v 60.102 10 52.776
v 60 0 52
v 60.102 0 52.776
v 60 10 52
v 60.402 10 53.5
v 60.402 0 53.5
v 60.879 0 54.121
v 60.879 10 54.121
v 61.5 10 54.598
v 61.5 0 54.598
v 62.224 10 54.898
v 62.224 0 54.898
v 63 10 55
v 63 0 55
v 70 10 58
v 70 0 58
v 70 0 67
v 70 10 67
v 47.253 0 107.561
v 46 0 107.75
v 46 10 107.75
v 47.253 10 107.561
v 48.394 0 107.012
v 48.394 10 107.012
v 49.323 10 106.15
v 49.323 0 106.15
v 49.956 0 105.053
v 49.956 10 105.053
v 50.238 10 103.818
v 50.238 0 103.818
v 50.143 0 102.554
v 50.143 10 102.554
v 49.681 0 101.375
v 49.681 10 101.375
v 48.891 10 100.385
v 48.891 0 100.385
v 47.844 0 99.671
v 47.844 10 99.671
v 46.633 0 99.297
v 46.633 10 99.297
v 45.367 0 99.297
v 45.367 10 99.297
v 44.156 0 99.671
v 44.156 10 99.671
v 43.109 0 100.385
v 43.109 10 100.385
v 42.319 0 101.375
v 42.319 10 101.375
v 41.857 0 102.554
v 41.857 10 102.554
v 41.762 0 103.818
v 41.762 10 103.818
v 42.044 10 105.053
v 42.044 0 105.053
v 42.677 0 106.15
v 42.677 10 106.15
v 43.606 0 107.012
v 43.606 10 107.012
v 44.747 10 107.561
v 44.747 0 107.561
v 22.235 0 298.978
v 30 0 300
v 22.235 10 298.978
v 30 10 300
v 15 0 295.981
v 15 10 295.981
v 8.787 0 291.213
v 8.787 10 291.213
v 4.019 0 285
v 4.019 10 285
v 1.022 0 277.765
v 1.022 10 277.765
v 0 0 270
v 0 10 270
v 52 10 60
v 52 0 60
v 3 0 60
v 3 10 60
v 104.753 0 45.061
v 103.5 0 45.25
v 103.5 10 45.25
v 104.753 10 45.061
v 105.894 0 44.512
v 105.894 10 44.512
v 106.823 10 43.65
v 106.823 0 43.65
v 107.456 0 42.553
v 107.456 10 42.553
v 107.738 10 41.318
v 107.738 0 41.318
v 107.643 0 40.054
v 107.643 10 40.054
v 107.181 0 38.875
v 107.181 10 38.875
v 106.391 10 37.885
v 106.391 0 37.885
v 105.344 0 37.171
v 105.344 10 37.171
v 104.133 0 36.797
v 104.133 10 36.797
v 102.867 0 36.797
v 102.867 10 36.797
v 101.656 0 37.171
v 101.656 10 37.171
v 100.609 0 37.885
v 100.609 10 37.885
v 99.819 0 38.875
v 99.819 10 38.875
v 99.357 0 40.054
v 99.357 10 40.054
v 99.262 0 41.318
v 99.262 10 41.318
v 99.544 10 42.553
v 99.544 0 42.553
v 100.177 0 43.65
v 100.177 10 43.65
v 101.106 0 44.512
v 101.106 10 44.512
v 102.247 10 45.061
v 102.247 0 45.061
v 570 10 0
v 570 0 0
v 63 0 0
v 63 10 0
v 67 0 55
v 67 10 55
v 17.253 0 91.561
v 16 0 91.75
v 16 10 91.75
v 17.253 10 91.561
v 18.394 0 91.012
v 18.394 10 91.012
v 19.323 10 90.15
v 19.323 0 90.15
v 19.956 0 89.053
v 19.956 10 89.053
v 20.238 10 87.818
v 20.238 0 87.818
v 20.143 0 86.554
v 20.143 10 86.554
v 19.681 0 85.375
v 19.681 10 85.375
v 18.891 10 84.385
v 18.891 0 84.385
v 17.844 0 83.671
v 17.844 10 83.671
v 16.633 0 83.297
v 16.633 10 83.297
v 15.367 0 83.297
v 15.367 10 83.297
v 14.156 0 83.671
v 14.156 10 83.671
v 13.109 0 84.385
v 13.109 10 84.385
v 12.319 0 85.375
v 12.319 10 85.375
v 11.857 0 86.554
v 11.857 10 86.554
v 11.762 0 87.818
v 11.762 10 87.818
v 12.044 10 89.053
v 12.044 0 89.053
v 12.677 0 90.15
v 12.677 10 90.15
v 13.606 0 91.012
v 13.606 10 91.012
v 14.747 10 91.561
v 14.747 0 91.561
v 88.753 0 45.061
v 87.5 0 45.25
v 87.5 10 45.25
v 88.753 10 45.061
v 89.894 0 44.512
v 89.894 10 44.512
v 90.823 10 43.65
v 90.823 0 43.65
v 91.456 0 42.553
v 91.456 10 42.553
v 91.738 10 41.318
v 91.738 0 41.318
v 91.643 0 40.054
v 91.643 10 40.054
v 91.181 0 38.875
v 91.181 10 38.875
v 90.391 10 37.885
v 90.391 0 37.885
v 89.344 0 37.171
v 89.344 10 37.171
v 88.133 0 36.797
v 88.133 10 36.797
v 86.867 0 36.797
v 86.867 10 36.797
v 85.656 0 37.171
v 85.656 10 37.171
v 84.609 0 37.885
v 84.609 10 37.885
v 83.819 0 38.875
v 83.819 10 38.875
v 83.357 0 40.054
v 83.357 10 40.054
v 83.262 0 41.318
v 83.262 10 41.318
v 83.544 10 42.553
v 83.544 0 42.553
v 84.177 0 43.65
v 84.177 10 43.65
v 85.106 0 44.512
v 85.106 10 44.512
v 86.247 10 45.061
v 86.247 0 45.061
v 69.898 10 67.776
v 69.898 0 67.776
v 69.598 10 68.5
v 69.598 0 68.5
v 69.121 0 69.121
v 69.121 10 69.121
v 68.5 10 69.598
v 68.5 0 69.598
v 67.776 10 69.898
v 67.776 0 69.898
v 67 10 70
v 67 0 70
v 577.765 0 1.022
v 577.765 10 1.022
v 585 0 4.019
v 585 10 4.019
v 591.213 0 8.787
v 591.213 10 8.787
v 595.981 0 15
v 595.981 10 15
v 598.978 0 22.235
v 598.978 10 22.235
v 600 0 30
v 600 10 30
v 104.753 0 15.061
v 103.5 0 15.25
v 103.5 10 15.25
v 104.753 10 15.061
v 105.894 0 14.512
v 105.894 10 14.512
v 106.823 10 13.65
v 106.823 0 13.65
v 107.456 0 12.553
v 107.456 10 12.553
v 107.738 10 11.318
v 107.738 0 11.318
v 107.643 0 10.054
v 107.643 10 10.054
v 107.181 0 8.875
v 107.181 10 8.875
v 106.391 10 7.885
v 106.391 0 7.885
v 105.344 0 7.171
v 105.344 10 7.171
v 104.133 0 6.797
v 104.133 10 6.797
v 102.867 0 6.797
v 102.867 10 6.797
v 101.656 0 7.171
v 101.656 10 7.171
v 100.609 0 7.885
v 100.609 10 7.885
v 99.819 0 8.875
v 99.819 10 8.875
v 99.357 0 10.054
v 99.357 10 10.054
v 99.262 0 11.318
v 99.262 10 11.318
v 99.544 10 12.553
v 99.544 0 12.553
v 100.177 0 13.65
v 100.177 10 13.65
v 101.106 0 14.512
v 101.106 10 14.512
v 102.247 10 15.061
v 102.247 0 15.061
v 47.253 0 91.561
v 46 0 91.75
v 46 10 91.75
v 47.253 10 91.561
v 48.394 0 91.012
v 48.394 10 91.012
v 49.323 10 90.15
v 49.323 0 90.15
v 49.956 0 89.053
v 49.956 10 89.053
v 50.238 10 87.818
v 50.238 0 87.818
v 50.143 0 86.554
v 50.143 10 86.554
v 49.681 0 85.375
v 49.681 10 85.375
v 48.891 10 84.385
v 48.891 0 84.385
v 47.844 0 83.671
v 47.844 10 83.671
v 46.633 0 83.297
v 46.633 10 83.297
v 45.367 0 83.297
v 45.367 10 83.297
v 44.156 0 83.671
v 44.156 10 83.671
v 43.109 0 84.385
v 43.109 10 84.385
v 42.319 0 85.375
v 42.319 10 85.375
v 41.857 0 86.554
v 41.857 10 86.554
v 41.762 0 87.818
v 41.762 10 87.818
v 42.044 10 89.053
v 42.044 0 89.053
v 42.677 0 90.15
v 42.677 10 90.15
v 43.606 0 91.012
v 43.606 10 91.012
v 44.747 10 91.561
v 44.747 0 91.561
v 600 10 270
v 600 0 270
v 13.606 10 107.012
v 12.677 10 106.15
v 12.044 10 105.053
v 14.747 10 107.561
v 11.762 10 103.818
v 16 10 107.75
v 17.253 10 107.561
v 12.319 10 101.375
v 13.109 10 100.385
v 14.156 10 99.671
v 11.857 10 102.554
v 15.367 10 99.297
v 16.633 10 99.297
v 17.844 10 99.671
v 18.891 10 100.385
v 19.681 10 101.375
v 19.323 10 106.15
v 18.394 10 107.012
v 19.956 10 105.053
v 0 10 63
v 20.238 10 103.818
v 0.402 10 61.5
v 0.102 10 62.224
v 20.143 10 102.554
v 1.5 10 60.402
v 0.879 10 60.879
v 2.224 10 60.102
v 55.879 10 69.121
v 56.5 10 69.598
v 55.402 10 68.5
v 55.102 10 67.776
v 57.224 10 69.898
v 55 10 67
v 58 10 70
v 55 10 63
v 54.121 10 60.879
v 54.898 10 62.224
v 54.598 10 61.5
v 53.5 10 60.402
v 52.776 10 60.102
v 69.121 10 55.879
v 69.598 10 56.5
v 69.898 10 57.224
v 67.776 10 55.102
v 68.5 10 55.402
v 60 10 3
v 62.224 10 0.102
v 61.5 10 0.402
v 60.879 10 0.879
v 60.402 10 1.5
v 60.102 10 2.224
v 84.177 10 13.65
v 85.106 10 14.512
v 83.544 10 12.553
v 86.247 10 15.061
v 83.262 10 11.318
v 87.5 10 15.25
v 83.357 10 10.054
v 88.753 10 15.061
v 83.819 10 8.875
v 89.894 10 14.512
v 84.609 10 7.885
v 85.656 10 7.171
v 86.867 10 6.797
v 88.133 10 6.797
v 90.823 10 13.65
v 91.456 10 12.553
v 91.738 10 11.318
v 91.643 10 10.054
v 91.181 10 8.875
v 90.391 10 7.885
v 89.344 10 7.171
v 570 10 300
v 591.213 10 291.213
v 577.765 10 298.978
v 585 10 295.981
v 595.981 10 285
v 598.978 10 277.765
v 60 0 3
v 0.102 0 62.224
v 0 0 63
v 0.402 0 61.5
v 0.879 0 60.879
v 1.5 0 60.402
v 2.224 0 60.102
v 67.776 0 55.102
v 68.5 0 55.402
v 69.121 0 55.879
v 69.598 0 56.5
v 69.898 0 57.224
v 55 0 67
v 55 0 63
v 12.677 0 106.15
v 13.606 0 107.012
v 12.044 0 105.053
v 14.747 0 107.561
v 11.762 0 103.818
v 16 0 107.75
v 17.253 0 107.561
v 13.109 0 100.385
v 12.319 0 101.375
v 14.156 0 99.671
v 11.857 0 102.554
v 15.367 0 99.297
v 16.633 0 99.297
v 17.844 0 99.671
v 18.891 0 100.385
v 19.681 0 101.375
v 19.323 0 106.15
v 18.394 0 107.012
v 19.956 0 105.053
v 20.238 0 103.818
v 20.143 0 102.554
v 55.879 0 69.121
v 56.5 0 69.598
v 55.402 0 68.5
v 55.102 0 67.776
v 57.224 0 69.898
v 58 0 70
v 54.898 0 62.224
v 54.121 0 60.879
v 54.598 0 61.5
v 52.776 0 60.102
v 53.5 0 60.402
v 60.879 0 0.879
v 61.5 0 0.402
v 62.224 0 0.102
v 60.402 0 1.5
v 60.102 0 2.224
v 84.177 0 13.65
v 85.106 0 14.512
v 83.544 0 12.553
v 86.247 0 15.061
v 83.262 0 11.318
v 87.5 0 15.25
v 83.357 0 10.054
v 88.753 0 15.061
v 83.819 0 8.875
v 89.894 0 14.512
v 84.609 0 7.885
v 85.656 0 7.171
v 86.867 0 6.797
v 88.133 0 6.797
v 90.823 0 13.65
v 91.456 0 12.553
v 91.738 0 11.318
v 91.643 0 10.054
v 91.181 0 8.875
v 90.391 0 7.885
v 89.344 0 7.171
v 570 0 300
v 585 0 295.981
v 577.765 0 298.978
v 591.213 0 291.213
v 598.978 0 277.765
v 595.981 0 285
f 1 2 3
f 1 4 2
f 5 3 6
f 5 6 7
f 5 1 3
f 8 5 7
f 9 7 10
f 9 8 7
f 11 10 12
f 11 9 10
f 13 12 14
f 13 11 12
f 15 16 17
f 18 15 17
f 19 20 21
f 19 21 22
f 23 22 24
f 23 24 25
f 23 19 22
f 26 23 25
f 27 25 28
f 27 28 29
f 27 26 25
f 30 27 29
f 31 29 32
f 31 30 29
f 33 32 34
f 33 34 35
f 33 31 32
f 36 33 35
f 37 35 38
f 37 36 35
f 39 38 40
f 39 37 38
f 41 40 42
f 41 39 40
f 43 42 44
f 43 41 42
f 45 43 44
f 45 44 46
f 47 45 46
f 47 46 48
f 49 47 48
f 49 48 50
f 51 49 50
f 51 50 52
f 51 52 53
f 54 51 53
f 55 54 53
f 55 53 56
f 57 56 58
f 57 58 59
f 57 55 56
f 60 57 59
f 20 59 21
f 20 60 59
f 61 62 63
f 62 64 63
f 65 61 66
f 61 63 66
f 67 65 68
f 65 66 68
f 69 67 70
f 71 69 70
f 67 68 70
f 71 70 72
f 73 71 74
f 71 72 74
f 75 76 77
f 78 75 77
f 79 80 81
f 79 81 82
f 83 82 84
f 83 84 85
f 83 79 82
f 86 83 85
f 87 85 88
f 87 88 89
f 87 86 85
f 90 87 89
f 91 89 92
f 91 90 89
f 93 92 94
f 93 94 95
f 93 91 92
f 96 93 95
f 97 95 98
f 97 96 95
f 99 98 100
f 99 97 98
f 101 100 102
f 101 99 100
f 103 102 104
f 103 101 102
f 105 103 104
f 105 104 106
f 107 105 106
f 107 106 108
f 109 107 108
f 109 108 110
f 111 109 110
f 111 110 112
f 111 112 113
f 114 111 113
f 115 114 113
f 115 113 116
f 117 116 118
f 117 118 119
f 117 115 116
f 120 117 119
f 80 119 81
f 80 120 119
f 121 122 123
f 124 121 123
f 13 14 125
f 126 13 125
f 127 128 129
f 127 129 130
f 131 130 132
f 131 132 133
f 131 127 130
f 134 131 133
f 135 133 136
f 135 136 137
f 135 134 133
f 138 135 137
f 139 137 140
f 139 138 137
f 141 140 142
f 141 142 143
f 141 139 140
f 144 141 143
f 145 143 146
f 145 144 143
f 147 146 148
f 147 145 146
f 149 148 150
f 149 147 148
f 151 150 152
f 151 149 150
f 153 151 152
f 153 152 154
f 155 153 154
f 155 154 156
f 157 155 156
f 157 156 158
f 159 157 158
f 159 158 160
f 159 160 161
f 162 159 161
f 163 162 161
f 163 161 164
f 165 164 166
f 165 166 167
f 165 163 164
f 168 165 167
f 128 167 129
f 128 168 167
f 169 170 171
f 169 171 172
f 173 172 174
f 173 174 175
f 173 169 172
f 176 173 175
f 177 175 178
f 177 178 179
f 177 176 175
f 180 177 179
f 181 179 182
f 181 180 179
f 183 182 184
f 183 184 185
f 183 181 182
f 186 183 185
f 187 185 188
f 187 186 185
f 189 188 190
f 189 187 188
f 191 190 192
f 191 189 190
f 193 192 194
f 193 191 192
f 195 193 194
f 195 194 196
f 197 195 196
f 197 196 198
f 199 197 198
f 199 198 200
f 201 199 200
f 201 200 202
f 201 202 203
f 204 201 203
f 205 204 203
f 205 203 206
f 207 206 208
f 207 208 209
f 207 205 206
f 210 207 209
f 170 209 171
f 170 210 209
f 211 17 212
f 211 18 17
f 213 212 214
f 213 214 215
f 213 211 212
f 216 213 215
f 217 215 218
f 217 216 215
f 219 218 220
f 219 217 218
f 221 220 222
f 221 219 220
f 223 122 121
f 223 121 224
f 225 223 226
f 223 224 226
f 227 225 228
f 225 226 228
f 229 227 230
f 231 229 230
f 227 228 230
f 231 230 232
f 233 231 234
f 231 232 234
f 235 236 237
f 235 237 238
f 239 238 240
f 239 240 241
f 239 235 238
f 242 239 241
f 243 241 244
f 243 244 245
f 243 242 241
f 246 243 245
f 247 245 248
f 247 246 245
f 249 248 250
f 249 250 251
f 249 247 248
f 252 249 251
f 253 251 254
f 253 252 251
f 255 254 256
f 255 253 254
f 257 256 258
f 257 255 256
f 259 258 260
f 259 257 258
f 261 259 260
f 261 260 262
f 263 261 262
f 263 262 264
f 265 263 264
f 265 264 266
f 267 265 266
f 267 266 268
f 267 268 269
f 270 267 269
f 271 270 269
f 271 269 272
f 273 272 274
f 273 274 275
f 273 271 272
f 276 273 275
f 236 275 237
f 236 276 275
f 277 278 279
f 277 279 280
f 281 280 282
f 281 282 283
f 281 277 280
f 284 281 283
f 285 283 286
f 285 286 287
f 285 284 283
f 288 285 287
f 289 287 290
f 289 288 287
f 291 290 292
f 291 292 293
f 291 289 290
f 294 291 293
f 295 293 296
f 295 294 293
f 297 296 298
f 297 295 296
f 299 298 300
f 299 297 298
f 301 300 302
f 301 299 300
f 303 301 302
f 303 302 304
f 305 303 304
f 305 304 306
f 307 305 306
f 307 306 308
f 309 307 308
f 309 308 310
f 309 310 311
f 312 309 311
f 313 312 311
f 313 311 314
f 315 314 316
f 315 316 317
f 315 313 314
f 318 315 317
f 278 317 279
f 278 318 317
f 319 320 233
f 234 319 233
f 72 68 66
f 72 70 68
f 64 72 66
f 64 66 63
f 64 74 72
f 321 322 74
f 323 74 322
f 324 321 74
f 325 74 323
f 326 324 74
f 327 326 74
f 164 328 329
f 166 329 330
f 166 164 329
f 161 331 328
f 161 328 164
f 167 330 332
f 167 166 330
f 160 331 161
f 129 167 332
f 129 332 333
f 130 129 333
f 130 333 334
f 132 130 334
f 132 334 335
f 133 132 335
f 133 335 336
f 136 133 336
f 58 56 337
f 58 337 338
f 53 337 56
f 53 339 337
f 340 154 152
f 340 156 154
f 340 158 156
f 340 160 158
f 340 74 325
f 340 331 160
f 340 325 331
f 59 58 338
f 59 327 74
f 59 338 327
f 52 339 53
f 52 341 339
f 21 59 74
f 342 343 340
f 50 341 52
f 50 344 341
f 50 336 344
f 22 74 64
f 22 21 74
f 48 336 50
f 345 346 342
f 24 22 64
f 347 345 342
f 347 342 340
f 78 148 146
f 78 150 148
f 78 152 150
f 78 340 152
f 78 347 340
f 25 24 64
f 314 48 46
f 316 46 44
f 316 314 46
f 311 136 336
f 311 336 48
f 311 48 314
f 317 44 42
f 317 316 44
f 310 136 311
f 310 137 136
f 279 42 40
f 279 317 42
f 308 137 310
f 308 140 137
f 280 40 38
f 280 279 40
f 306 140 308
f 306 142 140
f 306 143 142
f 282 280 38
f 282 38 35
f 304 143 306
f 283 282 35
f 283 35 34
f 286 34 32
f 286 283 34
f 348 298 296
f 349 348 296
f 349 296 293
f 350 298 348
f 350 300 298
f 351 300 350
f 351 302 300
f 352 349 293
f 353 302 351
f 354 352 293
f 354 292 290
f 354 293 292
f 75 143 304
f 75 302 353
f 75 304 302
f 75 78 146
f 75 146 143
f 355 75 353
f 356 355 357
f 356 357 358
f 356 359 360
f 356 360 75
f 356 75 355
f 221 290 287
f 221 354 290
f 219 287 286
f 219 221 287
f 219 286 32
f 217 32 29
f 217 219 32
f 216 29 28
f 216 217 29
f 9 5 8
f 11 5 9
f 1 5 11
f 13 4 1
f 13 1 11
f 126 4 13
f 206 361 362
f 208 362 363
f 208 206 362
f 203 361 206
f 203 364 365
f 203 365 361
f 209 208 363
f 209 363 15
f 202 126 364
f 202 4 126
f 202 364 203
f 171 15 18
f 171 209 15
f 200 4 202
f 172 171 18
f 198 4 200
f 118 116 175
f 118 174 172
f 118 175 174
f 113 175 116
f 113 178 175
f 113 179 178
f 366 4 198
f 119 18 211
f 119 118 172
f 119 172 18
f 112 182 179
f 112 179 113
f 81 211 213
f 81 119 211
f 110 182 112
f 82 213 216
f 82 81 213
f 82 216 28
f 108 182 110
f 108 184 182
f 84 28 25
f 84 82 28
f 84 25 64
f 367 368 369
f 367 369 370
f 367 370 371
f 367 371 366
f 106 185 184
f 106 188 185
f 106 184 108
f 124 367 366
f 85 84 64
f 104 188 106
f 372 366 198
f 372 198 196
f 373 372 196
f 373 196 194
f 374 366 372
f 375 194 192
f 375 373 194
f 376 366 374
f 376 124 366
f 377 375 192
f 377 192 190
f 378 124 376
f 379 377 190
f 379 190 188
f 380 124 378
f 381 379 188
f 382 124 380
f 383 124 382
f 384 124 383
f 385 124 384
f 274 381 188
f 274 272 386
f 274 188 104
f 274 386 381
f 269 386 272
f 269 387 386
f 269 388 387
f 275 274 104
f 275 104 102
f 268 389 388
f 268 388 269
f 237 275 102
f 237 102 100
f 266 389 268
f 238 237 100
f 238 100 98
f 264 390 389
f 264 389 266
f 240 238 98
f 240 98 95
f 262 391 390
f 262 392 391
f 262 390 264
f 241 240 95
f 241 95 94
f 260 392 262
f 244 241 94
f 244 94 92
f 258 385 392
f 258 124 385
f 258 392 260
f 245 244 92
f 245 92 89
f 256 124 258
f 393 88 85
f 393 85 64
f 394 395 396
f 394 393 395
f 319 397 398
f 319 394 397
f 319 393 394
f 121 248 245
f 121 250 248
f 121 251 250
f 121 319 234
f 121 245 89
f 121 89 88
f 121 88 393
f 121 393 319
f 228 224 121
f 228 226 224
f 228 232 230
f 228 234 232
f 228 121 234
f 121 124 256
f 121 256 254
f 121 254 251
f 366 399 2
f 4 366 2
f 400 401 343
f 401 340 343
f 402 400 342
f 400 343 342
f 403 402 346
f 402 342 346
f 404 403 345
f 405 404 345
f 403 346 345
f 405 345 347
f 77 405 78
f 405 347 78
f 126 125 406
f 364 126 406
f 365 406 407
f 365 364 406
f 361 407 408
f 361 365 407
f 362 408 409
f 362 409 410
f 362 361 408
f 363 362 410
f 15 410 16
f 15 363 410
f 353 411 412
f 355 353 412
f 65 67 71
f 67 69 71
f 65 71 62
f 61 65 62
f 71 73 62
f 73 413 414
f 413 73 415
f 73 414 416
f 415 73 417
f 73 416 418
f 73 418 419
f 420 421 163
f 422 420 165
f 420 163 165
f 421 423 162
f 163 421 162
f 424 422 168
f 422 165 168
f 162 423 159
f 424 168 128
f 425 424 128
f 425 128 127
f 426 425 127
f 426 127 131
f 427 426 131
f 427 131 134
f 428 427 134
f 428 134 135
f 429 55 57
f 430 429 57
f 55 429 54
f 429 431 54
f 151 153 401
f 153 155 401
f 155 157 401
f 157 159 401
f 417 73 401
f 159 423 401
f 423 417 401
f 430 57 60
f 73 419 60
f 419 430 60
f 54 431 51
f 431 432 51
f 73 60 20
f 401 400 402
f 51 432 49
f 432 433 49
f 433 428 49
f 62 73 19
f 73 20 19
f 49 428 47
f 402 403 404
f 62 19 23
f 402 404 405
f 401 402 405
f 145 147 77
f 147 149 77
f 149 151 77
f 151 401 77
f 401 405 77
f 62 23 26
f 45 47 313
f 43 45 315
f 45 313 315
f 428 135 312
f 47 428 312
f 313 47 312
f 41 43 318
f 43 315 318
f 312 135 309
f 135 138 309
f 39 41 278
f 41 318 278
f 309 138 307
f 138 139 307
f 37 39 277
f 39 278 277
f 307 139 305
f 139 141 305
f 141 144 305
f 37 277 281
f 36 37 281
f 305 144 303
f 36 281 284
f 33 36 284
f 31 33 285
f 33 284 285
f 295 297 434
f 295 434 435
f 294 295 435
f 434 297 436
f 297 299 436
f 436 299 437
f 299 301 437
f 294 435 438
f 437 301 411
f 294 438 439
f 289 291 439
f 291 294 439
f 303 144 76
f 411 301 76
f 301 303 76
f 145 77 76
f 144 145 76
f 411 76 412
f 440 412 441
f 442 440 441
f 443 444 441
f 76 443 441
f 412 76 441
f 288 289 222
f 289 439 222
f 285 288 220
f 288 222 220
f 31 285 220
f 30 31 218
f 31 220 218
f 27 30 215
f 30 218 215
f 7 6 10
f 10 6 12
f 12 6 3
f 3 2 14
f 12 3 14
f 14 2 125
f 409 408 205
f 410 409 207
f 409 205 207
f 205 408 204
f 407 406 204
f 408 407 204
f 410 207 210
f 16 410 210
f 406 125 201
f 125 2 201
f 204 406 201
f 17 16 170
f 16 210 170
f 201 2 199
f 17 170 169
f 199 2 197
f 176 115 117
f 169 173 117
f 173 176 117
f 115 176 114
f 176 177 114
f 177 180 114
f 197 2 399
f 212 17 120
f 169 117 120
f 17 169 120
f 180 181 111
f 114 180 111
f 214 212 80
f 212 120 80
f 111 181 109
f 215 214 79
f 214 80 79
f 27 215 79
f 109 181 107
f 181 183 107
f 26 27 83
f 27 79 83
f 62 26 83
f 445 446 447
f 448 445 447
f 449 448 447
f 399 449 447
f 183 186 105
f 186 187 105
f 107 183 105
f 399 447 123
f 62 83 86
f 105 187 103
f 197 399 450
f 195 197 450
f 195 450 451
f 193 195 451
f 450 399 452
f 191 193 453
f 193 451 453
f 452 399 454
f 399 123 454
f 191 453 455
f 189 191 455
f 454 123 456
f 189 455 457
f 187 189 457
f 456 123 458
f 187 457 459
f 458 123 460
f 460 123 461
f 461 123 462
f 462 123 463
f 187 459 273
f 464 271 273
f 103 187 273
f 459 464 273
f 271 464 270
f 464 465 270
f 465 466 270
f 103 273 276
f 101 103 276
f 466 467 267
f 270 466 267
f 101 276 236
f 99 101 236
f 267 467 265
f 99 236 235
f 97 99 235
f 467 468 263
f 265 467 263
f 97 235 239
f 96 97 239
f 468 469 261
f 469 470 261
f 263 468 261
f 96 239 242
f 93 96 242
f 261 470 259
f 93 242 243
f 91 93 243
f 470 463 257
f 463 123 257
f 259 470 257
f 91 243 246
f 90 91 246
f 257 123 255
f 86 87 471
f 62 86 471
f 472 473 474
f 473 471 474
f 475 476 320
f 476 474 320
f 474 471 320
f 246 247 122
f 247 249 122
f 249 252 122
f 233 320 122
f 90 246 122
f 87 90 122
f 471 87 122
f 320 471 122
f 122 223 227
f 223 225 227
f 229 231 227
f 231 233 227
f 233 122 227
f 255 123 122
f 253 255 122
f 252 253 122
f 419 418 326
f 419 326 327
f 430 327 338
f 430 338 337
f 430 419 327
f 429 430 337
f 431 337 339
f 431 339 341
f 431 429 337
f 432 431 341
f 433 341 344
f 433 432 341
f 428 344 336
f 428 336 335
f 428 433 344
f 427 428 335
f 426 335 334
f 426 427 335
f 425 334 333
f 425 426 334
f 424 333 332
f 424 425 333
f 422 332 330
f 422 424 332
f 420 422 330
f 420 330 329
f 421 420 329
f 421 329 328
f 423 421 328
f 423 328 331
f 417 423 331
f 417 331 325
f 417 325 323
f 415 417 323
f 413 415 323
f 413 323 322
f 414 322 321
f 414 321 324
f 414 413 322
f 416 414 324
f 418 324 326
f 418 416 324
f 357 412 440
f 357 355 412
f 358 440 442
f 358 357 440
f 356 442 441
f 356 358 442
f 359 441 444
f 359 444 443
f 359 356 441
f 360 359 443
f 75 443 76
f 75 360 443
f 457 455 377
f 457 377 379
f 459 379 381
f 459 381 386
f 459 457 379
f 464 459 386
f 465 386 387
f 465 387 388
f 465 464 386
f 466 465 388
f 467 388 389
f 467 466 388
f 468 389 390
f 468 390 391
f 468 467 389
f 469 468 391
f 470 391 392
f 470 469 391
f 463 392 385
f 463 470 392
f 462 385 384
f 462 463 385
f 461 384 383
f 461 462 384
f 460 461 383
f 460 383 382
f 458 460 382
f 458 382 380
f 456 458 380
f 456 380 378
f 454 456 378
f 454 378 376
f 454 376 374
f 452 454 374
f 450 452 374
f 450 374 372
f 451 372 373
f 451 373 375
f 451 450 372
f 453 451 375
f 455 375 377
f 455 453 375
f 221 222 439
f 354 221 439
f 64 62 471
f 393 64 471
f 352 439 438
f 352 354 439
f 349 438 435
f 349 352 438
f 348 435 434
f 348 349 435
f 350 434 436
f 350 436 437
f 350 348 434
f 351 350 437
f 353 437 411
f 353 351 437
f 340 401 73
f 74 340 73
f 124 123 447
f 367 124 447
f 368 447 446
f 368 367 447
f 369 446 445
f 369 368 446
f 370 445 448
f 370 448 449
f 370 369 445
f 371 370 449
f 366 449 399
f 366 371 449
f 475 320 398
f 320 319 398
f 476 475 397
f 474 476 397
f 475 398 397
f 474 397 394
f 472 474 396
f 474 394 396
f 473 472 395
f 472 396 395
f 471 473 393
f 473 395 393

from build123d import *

# Parameters (mm, degrees)
SKETCH_1_R      = 4.25
EXTRUDE_1_DEPTH = 10
FILLET_1_R      = 30
FILLET_2_R      = 3


with BuildPart() as part:
    # 草图1 → 凸台-拉伸1 (new body)
    with BuildSketch(Plane(origin=(0, 0, 0), x_dir=(1, 0, 0), z_dir=(0, 1, 0))):
        Polygon((60, 0), (60, -55), (70, -55), (70, -70), (55, -70), (55, -60), (0, -60), (0, -300), (600, -300), (600, 0), align=None)
        with Locations(Location((103.5, -11, 0), (0, 0, 270))):
            Circle(SKETCH_1_R, mode=Mode.SUBTRACT)
        with Locations(Location((87.5, -11, 0), (0, 0, 270))):
            Circle(SKETCH_1_R, mode=Mode.SUBTRACT)
        with Locations(Location((103.5, -41, 0), (0, 0, 270))):
            Circle(SKETCH_1_R, mode=Mode.SUBTRACT)
        with Locations(Location((87.5, -41, 0), (0, 0, 270))):
            Circle(SKETCH_1_R, mode=Mode.SUBTRACT)
        with Locations(Location((16, -87.5, 0), (0, 0, 270))):
            Circle(SKETCH_1_R, mode=Mode.SUBTRACT)
        with Locations(Location((46, -87.5, 0), (0, 0, 270))):
            Circle(SKETCH_1_R, mode=Mode.SUBTRACT)
        with Locations(Location((16, -103.5, 0), (0, 0, 270))):
            Circle(SKETCH_1_R, mode=Mode.SUBTRACT)
        with Locations(Location((46, -103.5, 0), (0, 0, 270))):
            Circle(SKETCH_1_R, mode=Mode.SUBTRACT)
    extrude(amount=EXTRUDE_1_DEPTH)

    # 圆角1
    fillet_1_edges = [part.edges().sort_by_distance(p)[0] for p in [
        (600, 5, 300),
        (0, 5, 300),
        (600, 5, 0),
    ]]
    fillet(fillet_1_edges, radius=FILLET_1_R)

    # 圆角2
    fillet_2_edges = [part.edges().sort_by_distance(p)[0] for p in [
        (0, 5, 60),
        (55, 5, 60),
        (55, 5, 70),
        (70, 5, 70),
        (70, 5, 55),
        (60, 5, 55),
        (60, 5, 0),
    ]]
    fillet(fillet_2_edges, radius=FILLET_2_R)


solid = part.part
